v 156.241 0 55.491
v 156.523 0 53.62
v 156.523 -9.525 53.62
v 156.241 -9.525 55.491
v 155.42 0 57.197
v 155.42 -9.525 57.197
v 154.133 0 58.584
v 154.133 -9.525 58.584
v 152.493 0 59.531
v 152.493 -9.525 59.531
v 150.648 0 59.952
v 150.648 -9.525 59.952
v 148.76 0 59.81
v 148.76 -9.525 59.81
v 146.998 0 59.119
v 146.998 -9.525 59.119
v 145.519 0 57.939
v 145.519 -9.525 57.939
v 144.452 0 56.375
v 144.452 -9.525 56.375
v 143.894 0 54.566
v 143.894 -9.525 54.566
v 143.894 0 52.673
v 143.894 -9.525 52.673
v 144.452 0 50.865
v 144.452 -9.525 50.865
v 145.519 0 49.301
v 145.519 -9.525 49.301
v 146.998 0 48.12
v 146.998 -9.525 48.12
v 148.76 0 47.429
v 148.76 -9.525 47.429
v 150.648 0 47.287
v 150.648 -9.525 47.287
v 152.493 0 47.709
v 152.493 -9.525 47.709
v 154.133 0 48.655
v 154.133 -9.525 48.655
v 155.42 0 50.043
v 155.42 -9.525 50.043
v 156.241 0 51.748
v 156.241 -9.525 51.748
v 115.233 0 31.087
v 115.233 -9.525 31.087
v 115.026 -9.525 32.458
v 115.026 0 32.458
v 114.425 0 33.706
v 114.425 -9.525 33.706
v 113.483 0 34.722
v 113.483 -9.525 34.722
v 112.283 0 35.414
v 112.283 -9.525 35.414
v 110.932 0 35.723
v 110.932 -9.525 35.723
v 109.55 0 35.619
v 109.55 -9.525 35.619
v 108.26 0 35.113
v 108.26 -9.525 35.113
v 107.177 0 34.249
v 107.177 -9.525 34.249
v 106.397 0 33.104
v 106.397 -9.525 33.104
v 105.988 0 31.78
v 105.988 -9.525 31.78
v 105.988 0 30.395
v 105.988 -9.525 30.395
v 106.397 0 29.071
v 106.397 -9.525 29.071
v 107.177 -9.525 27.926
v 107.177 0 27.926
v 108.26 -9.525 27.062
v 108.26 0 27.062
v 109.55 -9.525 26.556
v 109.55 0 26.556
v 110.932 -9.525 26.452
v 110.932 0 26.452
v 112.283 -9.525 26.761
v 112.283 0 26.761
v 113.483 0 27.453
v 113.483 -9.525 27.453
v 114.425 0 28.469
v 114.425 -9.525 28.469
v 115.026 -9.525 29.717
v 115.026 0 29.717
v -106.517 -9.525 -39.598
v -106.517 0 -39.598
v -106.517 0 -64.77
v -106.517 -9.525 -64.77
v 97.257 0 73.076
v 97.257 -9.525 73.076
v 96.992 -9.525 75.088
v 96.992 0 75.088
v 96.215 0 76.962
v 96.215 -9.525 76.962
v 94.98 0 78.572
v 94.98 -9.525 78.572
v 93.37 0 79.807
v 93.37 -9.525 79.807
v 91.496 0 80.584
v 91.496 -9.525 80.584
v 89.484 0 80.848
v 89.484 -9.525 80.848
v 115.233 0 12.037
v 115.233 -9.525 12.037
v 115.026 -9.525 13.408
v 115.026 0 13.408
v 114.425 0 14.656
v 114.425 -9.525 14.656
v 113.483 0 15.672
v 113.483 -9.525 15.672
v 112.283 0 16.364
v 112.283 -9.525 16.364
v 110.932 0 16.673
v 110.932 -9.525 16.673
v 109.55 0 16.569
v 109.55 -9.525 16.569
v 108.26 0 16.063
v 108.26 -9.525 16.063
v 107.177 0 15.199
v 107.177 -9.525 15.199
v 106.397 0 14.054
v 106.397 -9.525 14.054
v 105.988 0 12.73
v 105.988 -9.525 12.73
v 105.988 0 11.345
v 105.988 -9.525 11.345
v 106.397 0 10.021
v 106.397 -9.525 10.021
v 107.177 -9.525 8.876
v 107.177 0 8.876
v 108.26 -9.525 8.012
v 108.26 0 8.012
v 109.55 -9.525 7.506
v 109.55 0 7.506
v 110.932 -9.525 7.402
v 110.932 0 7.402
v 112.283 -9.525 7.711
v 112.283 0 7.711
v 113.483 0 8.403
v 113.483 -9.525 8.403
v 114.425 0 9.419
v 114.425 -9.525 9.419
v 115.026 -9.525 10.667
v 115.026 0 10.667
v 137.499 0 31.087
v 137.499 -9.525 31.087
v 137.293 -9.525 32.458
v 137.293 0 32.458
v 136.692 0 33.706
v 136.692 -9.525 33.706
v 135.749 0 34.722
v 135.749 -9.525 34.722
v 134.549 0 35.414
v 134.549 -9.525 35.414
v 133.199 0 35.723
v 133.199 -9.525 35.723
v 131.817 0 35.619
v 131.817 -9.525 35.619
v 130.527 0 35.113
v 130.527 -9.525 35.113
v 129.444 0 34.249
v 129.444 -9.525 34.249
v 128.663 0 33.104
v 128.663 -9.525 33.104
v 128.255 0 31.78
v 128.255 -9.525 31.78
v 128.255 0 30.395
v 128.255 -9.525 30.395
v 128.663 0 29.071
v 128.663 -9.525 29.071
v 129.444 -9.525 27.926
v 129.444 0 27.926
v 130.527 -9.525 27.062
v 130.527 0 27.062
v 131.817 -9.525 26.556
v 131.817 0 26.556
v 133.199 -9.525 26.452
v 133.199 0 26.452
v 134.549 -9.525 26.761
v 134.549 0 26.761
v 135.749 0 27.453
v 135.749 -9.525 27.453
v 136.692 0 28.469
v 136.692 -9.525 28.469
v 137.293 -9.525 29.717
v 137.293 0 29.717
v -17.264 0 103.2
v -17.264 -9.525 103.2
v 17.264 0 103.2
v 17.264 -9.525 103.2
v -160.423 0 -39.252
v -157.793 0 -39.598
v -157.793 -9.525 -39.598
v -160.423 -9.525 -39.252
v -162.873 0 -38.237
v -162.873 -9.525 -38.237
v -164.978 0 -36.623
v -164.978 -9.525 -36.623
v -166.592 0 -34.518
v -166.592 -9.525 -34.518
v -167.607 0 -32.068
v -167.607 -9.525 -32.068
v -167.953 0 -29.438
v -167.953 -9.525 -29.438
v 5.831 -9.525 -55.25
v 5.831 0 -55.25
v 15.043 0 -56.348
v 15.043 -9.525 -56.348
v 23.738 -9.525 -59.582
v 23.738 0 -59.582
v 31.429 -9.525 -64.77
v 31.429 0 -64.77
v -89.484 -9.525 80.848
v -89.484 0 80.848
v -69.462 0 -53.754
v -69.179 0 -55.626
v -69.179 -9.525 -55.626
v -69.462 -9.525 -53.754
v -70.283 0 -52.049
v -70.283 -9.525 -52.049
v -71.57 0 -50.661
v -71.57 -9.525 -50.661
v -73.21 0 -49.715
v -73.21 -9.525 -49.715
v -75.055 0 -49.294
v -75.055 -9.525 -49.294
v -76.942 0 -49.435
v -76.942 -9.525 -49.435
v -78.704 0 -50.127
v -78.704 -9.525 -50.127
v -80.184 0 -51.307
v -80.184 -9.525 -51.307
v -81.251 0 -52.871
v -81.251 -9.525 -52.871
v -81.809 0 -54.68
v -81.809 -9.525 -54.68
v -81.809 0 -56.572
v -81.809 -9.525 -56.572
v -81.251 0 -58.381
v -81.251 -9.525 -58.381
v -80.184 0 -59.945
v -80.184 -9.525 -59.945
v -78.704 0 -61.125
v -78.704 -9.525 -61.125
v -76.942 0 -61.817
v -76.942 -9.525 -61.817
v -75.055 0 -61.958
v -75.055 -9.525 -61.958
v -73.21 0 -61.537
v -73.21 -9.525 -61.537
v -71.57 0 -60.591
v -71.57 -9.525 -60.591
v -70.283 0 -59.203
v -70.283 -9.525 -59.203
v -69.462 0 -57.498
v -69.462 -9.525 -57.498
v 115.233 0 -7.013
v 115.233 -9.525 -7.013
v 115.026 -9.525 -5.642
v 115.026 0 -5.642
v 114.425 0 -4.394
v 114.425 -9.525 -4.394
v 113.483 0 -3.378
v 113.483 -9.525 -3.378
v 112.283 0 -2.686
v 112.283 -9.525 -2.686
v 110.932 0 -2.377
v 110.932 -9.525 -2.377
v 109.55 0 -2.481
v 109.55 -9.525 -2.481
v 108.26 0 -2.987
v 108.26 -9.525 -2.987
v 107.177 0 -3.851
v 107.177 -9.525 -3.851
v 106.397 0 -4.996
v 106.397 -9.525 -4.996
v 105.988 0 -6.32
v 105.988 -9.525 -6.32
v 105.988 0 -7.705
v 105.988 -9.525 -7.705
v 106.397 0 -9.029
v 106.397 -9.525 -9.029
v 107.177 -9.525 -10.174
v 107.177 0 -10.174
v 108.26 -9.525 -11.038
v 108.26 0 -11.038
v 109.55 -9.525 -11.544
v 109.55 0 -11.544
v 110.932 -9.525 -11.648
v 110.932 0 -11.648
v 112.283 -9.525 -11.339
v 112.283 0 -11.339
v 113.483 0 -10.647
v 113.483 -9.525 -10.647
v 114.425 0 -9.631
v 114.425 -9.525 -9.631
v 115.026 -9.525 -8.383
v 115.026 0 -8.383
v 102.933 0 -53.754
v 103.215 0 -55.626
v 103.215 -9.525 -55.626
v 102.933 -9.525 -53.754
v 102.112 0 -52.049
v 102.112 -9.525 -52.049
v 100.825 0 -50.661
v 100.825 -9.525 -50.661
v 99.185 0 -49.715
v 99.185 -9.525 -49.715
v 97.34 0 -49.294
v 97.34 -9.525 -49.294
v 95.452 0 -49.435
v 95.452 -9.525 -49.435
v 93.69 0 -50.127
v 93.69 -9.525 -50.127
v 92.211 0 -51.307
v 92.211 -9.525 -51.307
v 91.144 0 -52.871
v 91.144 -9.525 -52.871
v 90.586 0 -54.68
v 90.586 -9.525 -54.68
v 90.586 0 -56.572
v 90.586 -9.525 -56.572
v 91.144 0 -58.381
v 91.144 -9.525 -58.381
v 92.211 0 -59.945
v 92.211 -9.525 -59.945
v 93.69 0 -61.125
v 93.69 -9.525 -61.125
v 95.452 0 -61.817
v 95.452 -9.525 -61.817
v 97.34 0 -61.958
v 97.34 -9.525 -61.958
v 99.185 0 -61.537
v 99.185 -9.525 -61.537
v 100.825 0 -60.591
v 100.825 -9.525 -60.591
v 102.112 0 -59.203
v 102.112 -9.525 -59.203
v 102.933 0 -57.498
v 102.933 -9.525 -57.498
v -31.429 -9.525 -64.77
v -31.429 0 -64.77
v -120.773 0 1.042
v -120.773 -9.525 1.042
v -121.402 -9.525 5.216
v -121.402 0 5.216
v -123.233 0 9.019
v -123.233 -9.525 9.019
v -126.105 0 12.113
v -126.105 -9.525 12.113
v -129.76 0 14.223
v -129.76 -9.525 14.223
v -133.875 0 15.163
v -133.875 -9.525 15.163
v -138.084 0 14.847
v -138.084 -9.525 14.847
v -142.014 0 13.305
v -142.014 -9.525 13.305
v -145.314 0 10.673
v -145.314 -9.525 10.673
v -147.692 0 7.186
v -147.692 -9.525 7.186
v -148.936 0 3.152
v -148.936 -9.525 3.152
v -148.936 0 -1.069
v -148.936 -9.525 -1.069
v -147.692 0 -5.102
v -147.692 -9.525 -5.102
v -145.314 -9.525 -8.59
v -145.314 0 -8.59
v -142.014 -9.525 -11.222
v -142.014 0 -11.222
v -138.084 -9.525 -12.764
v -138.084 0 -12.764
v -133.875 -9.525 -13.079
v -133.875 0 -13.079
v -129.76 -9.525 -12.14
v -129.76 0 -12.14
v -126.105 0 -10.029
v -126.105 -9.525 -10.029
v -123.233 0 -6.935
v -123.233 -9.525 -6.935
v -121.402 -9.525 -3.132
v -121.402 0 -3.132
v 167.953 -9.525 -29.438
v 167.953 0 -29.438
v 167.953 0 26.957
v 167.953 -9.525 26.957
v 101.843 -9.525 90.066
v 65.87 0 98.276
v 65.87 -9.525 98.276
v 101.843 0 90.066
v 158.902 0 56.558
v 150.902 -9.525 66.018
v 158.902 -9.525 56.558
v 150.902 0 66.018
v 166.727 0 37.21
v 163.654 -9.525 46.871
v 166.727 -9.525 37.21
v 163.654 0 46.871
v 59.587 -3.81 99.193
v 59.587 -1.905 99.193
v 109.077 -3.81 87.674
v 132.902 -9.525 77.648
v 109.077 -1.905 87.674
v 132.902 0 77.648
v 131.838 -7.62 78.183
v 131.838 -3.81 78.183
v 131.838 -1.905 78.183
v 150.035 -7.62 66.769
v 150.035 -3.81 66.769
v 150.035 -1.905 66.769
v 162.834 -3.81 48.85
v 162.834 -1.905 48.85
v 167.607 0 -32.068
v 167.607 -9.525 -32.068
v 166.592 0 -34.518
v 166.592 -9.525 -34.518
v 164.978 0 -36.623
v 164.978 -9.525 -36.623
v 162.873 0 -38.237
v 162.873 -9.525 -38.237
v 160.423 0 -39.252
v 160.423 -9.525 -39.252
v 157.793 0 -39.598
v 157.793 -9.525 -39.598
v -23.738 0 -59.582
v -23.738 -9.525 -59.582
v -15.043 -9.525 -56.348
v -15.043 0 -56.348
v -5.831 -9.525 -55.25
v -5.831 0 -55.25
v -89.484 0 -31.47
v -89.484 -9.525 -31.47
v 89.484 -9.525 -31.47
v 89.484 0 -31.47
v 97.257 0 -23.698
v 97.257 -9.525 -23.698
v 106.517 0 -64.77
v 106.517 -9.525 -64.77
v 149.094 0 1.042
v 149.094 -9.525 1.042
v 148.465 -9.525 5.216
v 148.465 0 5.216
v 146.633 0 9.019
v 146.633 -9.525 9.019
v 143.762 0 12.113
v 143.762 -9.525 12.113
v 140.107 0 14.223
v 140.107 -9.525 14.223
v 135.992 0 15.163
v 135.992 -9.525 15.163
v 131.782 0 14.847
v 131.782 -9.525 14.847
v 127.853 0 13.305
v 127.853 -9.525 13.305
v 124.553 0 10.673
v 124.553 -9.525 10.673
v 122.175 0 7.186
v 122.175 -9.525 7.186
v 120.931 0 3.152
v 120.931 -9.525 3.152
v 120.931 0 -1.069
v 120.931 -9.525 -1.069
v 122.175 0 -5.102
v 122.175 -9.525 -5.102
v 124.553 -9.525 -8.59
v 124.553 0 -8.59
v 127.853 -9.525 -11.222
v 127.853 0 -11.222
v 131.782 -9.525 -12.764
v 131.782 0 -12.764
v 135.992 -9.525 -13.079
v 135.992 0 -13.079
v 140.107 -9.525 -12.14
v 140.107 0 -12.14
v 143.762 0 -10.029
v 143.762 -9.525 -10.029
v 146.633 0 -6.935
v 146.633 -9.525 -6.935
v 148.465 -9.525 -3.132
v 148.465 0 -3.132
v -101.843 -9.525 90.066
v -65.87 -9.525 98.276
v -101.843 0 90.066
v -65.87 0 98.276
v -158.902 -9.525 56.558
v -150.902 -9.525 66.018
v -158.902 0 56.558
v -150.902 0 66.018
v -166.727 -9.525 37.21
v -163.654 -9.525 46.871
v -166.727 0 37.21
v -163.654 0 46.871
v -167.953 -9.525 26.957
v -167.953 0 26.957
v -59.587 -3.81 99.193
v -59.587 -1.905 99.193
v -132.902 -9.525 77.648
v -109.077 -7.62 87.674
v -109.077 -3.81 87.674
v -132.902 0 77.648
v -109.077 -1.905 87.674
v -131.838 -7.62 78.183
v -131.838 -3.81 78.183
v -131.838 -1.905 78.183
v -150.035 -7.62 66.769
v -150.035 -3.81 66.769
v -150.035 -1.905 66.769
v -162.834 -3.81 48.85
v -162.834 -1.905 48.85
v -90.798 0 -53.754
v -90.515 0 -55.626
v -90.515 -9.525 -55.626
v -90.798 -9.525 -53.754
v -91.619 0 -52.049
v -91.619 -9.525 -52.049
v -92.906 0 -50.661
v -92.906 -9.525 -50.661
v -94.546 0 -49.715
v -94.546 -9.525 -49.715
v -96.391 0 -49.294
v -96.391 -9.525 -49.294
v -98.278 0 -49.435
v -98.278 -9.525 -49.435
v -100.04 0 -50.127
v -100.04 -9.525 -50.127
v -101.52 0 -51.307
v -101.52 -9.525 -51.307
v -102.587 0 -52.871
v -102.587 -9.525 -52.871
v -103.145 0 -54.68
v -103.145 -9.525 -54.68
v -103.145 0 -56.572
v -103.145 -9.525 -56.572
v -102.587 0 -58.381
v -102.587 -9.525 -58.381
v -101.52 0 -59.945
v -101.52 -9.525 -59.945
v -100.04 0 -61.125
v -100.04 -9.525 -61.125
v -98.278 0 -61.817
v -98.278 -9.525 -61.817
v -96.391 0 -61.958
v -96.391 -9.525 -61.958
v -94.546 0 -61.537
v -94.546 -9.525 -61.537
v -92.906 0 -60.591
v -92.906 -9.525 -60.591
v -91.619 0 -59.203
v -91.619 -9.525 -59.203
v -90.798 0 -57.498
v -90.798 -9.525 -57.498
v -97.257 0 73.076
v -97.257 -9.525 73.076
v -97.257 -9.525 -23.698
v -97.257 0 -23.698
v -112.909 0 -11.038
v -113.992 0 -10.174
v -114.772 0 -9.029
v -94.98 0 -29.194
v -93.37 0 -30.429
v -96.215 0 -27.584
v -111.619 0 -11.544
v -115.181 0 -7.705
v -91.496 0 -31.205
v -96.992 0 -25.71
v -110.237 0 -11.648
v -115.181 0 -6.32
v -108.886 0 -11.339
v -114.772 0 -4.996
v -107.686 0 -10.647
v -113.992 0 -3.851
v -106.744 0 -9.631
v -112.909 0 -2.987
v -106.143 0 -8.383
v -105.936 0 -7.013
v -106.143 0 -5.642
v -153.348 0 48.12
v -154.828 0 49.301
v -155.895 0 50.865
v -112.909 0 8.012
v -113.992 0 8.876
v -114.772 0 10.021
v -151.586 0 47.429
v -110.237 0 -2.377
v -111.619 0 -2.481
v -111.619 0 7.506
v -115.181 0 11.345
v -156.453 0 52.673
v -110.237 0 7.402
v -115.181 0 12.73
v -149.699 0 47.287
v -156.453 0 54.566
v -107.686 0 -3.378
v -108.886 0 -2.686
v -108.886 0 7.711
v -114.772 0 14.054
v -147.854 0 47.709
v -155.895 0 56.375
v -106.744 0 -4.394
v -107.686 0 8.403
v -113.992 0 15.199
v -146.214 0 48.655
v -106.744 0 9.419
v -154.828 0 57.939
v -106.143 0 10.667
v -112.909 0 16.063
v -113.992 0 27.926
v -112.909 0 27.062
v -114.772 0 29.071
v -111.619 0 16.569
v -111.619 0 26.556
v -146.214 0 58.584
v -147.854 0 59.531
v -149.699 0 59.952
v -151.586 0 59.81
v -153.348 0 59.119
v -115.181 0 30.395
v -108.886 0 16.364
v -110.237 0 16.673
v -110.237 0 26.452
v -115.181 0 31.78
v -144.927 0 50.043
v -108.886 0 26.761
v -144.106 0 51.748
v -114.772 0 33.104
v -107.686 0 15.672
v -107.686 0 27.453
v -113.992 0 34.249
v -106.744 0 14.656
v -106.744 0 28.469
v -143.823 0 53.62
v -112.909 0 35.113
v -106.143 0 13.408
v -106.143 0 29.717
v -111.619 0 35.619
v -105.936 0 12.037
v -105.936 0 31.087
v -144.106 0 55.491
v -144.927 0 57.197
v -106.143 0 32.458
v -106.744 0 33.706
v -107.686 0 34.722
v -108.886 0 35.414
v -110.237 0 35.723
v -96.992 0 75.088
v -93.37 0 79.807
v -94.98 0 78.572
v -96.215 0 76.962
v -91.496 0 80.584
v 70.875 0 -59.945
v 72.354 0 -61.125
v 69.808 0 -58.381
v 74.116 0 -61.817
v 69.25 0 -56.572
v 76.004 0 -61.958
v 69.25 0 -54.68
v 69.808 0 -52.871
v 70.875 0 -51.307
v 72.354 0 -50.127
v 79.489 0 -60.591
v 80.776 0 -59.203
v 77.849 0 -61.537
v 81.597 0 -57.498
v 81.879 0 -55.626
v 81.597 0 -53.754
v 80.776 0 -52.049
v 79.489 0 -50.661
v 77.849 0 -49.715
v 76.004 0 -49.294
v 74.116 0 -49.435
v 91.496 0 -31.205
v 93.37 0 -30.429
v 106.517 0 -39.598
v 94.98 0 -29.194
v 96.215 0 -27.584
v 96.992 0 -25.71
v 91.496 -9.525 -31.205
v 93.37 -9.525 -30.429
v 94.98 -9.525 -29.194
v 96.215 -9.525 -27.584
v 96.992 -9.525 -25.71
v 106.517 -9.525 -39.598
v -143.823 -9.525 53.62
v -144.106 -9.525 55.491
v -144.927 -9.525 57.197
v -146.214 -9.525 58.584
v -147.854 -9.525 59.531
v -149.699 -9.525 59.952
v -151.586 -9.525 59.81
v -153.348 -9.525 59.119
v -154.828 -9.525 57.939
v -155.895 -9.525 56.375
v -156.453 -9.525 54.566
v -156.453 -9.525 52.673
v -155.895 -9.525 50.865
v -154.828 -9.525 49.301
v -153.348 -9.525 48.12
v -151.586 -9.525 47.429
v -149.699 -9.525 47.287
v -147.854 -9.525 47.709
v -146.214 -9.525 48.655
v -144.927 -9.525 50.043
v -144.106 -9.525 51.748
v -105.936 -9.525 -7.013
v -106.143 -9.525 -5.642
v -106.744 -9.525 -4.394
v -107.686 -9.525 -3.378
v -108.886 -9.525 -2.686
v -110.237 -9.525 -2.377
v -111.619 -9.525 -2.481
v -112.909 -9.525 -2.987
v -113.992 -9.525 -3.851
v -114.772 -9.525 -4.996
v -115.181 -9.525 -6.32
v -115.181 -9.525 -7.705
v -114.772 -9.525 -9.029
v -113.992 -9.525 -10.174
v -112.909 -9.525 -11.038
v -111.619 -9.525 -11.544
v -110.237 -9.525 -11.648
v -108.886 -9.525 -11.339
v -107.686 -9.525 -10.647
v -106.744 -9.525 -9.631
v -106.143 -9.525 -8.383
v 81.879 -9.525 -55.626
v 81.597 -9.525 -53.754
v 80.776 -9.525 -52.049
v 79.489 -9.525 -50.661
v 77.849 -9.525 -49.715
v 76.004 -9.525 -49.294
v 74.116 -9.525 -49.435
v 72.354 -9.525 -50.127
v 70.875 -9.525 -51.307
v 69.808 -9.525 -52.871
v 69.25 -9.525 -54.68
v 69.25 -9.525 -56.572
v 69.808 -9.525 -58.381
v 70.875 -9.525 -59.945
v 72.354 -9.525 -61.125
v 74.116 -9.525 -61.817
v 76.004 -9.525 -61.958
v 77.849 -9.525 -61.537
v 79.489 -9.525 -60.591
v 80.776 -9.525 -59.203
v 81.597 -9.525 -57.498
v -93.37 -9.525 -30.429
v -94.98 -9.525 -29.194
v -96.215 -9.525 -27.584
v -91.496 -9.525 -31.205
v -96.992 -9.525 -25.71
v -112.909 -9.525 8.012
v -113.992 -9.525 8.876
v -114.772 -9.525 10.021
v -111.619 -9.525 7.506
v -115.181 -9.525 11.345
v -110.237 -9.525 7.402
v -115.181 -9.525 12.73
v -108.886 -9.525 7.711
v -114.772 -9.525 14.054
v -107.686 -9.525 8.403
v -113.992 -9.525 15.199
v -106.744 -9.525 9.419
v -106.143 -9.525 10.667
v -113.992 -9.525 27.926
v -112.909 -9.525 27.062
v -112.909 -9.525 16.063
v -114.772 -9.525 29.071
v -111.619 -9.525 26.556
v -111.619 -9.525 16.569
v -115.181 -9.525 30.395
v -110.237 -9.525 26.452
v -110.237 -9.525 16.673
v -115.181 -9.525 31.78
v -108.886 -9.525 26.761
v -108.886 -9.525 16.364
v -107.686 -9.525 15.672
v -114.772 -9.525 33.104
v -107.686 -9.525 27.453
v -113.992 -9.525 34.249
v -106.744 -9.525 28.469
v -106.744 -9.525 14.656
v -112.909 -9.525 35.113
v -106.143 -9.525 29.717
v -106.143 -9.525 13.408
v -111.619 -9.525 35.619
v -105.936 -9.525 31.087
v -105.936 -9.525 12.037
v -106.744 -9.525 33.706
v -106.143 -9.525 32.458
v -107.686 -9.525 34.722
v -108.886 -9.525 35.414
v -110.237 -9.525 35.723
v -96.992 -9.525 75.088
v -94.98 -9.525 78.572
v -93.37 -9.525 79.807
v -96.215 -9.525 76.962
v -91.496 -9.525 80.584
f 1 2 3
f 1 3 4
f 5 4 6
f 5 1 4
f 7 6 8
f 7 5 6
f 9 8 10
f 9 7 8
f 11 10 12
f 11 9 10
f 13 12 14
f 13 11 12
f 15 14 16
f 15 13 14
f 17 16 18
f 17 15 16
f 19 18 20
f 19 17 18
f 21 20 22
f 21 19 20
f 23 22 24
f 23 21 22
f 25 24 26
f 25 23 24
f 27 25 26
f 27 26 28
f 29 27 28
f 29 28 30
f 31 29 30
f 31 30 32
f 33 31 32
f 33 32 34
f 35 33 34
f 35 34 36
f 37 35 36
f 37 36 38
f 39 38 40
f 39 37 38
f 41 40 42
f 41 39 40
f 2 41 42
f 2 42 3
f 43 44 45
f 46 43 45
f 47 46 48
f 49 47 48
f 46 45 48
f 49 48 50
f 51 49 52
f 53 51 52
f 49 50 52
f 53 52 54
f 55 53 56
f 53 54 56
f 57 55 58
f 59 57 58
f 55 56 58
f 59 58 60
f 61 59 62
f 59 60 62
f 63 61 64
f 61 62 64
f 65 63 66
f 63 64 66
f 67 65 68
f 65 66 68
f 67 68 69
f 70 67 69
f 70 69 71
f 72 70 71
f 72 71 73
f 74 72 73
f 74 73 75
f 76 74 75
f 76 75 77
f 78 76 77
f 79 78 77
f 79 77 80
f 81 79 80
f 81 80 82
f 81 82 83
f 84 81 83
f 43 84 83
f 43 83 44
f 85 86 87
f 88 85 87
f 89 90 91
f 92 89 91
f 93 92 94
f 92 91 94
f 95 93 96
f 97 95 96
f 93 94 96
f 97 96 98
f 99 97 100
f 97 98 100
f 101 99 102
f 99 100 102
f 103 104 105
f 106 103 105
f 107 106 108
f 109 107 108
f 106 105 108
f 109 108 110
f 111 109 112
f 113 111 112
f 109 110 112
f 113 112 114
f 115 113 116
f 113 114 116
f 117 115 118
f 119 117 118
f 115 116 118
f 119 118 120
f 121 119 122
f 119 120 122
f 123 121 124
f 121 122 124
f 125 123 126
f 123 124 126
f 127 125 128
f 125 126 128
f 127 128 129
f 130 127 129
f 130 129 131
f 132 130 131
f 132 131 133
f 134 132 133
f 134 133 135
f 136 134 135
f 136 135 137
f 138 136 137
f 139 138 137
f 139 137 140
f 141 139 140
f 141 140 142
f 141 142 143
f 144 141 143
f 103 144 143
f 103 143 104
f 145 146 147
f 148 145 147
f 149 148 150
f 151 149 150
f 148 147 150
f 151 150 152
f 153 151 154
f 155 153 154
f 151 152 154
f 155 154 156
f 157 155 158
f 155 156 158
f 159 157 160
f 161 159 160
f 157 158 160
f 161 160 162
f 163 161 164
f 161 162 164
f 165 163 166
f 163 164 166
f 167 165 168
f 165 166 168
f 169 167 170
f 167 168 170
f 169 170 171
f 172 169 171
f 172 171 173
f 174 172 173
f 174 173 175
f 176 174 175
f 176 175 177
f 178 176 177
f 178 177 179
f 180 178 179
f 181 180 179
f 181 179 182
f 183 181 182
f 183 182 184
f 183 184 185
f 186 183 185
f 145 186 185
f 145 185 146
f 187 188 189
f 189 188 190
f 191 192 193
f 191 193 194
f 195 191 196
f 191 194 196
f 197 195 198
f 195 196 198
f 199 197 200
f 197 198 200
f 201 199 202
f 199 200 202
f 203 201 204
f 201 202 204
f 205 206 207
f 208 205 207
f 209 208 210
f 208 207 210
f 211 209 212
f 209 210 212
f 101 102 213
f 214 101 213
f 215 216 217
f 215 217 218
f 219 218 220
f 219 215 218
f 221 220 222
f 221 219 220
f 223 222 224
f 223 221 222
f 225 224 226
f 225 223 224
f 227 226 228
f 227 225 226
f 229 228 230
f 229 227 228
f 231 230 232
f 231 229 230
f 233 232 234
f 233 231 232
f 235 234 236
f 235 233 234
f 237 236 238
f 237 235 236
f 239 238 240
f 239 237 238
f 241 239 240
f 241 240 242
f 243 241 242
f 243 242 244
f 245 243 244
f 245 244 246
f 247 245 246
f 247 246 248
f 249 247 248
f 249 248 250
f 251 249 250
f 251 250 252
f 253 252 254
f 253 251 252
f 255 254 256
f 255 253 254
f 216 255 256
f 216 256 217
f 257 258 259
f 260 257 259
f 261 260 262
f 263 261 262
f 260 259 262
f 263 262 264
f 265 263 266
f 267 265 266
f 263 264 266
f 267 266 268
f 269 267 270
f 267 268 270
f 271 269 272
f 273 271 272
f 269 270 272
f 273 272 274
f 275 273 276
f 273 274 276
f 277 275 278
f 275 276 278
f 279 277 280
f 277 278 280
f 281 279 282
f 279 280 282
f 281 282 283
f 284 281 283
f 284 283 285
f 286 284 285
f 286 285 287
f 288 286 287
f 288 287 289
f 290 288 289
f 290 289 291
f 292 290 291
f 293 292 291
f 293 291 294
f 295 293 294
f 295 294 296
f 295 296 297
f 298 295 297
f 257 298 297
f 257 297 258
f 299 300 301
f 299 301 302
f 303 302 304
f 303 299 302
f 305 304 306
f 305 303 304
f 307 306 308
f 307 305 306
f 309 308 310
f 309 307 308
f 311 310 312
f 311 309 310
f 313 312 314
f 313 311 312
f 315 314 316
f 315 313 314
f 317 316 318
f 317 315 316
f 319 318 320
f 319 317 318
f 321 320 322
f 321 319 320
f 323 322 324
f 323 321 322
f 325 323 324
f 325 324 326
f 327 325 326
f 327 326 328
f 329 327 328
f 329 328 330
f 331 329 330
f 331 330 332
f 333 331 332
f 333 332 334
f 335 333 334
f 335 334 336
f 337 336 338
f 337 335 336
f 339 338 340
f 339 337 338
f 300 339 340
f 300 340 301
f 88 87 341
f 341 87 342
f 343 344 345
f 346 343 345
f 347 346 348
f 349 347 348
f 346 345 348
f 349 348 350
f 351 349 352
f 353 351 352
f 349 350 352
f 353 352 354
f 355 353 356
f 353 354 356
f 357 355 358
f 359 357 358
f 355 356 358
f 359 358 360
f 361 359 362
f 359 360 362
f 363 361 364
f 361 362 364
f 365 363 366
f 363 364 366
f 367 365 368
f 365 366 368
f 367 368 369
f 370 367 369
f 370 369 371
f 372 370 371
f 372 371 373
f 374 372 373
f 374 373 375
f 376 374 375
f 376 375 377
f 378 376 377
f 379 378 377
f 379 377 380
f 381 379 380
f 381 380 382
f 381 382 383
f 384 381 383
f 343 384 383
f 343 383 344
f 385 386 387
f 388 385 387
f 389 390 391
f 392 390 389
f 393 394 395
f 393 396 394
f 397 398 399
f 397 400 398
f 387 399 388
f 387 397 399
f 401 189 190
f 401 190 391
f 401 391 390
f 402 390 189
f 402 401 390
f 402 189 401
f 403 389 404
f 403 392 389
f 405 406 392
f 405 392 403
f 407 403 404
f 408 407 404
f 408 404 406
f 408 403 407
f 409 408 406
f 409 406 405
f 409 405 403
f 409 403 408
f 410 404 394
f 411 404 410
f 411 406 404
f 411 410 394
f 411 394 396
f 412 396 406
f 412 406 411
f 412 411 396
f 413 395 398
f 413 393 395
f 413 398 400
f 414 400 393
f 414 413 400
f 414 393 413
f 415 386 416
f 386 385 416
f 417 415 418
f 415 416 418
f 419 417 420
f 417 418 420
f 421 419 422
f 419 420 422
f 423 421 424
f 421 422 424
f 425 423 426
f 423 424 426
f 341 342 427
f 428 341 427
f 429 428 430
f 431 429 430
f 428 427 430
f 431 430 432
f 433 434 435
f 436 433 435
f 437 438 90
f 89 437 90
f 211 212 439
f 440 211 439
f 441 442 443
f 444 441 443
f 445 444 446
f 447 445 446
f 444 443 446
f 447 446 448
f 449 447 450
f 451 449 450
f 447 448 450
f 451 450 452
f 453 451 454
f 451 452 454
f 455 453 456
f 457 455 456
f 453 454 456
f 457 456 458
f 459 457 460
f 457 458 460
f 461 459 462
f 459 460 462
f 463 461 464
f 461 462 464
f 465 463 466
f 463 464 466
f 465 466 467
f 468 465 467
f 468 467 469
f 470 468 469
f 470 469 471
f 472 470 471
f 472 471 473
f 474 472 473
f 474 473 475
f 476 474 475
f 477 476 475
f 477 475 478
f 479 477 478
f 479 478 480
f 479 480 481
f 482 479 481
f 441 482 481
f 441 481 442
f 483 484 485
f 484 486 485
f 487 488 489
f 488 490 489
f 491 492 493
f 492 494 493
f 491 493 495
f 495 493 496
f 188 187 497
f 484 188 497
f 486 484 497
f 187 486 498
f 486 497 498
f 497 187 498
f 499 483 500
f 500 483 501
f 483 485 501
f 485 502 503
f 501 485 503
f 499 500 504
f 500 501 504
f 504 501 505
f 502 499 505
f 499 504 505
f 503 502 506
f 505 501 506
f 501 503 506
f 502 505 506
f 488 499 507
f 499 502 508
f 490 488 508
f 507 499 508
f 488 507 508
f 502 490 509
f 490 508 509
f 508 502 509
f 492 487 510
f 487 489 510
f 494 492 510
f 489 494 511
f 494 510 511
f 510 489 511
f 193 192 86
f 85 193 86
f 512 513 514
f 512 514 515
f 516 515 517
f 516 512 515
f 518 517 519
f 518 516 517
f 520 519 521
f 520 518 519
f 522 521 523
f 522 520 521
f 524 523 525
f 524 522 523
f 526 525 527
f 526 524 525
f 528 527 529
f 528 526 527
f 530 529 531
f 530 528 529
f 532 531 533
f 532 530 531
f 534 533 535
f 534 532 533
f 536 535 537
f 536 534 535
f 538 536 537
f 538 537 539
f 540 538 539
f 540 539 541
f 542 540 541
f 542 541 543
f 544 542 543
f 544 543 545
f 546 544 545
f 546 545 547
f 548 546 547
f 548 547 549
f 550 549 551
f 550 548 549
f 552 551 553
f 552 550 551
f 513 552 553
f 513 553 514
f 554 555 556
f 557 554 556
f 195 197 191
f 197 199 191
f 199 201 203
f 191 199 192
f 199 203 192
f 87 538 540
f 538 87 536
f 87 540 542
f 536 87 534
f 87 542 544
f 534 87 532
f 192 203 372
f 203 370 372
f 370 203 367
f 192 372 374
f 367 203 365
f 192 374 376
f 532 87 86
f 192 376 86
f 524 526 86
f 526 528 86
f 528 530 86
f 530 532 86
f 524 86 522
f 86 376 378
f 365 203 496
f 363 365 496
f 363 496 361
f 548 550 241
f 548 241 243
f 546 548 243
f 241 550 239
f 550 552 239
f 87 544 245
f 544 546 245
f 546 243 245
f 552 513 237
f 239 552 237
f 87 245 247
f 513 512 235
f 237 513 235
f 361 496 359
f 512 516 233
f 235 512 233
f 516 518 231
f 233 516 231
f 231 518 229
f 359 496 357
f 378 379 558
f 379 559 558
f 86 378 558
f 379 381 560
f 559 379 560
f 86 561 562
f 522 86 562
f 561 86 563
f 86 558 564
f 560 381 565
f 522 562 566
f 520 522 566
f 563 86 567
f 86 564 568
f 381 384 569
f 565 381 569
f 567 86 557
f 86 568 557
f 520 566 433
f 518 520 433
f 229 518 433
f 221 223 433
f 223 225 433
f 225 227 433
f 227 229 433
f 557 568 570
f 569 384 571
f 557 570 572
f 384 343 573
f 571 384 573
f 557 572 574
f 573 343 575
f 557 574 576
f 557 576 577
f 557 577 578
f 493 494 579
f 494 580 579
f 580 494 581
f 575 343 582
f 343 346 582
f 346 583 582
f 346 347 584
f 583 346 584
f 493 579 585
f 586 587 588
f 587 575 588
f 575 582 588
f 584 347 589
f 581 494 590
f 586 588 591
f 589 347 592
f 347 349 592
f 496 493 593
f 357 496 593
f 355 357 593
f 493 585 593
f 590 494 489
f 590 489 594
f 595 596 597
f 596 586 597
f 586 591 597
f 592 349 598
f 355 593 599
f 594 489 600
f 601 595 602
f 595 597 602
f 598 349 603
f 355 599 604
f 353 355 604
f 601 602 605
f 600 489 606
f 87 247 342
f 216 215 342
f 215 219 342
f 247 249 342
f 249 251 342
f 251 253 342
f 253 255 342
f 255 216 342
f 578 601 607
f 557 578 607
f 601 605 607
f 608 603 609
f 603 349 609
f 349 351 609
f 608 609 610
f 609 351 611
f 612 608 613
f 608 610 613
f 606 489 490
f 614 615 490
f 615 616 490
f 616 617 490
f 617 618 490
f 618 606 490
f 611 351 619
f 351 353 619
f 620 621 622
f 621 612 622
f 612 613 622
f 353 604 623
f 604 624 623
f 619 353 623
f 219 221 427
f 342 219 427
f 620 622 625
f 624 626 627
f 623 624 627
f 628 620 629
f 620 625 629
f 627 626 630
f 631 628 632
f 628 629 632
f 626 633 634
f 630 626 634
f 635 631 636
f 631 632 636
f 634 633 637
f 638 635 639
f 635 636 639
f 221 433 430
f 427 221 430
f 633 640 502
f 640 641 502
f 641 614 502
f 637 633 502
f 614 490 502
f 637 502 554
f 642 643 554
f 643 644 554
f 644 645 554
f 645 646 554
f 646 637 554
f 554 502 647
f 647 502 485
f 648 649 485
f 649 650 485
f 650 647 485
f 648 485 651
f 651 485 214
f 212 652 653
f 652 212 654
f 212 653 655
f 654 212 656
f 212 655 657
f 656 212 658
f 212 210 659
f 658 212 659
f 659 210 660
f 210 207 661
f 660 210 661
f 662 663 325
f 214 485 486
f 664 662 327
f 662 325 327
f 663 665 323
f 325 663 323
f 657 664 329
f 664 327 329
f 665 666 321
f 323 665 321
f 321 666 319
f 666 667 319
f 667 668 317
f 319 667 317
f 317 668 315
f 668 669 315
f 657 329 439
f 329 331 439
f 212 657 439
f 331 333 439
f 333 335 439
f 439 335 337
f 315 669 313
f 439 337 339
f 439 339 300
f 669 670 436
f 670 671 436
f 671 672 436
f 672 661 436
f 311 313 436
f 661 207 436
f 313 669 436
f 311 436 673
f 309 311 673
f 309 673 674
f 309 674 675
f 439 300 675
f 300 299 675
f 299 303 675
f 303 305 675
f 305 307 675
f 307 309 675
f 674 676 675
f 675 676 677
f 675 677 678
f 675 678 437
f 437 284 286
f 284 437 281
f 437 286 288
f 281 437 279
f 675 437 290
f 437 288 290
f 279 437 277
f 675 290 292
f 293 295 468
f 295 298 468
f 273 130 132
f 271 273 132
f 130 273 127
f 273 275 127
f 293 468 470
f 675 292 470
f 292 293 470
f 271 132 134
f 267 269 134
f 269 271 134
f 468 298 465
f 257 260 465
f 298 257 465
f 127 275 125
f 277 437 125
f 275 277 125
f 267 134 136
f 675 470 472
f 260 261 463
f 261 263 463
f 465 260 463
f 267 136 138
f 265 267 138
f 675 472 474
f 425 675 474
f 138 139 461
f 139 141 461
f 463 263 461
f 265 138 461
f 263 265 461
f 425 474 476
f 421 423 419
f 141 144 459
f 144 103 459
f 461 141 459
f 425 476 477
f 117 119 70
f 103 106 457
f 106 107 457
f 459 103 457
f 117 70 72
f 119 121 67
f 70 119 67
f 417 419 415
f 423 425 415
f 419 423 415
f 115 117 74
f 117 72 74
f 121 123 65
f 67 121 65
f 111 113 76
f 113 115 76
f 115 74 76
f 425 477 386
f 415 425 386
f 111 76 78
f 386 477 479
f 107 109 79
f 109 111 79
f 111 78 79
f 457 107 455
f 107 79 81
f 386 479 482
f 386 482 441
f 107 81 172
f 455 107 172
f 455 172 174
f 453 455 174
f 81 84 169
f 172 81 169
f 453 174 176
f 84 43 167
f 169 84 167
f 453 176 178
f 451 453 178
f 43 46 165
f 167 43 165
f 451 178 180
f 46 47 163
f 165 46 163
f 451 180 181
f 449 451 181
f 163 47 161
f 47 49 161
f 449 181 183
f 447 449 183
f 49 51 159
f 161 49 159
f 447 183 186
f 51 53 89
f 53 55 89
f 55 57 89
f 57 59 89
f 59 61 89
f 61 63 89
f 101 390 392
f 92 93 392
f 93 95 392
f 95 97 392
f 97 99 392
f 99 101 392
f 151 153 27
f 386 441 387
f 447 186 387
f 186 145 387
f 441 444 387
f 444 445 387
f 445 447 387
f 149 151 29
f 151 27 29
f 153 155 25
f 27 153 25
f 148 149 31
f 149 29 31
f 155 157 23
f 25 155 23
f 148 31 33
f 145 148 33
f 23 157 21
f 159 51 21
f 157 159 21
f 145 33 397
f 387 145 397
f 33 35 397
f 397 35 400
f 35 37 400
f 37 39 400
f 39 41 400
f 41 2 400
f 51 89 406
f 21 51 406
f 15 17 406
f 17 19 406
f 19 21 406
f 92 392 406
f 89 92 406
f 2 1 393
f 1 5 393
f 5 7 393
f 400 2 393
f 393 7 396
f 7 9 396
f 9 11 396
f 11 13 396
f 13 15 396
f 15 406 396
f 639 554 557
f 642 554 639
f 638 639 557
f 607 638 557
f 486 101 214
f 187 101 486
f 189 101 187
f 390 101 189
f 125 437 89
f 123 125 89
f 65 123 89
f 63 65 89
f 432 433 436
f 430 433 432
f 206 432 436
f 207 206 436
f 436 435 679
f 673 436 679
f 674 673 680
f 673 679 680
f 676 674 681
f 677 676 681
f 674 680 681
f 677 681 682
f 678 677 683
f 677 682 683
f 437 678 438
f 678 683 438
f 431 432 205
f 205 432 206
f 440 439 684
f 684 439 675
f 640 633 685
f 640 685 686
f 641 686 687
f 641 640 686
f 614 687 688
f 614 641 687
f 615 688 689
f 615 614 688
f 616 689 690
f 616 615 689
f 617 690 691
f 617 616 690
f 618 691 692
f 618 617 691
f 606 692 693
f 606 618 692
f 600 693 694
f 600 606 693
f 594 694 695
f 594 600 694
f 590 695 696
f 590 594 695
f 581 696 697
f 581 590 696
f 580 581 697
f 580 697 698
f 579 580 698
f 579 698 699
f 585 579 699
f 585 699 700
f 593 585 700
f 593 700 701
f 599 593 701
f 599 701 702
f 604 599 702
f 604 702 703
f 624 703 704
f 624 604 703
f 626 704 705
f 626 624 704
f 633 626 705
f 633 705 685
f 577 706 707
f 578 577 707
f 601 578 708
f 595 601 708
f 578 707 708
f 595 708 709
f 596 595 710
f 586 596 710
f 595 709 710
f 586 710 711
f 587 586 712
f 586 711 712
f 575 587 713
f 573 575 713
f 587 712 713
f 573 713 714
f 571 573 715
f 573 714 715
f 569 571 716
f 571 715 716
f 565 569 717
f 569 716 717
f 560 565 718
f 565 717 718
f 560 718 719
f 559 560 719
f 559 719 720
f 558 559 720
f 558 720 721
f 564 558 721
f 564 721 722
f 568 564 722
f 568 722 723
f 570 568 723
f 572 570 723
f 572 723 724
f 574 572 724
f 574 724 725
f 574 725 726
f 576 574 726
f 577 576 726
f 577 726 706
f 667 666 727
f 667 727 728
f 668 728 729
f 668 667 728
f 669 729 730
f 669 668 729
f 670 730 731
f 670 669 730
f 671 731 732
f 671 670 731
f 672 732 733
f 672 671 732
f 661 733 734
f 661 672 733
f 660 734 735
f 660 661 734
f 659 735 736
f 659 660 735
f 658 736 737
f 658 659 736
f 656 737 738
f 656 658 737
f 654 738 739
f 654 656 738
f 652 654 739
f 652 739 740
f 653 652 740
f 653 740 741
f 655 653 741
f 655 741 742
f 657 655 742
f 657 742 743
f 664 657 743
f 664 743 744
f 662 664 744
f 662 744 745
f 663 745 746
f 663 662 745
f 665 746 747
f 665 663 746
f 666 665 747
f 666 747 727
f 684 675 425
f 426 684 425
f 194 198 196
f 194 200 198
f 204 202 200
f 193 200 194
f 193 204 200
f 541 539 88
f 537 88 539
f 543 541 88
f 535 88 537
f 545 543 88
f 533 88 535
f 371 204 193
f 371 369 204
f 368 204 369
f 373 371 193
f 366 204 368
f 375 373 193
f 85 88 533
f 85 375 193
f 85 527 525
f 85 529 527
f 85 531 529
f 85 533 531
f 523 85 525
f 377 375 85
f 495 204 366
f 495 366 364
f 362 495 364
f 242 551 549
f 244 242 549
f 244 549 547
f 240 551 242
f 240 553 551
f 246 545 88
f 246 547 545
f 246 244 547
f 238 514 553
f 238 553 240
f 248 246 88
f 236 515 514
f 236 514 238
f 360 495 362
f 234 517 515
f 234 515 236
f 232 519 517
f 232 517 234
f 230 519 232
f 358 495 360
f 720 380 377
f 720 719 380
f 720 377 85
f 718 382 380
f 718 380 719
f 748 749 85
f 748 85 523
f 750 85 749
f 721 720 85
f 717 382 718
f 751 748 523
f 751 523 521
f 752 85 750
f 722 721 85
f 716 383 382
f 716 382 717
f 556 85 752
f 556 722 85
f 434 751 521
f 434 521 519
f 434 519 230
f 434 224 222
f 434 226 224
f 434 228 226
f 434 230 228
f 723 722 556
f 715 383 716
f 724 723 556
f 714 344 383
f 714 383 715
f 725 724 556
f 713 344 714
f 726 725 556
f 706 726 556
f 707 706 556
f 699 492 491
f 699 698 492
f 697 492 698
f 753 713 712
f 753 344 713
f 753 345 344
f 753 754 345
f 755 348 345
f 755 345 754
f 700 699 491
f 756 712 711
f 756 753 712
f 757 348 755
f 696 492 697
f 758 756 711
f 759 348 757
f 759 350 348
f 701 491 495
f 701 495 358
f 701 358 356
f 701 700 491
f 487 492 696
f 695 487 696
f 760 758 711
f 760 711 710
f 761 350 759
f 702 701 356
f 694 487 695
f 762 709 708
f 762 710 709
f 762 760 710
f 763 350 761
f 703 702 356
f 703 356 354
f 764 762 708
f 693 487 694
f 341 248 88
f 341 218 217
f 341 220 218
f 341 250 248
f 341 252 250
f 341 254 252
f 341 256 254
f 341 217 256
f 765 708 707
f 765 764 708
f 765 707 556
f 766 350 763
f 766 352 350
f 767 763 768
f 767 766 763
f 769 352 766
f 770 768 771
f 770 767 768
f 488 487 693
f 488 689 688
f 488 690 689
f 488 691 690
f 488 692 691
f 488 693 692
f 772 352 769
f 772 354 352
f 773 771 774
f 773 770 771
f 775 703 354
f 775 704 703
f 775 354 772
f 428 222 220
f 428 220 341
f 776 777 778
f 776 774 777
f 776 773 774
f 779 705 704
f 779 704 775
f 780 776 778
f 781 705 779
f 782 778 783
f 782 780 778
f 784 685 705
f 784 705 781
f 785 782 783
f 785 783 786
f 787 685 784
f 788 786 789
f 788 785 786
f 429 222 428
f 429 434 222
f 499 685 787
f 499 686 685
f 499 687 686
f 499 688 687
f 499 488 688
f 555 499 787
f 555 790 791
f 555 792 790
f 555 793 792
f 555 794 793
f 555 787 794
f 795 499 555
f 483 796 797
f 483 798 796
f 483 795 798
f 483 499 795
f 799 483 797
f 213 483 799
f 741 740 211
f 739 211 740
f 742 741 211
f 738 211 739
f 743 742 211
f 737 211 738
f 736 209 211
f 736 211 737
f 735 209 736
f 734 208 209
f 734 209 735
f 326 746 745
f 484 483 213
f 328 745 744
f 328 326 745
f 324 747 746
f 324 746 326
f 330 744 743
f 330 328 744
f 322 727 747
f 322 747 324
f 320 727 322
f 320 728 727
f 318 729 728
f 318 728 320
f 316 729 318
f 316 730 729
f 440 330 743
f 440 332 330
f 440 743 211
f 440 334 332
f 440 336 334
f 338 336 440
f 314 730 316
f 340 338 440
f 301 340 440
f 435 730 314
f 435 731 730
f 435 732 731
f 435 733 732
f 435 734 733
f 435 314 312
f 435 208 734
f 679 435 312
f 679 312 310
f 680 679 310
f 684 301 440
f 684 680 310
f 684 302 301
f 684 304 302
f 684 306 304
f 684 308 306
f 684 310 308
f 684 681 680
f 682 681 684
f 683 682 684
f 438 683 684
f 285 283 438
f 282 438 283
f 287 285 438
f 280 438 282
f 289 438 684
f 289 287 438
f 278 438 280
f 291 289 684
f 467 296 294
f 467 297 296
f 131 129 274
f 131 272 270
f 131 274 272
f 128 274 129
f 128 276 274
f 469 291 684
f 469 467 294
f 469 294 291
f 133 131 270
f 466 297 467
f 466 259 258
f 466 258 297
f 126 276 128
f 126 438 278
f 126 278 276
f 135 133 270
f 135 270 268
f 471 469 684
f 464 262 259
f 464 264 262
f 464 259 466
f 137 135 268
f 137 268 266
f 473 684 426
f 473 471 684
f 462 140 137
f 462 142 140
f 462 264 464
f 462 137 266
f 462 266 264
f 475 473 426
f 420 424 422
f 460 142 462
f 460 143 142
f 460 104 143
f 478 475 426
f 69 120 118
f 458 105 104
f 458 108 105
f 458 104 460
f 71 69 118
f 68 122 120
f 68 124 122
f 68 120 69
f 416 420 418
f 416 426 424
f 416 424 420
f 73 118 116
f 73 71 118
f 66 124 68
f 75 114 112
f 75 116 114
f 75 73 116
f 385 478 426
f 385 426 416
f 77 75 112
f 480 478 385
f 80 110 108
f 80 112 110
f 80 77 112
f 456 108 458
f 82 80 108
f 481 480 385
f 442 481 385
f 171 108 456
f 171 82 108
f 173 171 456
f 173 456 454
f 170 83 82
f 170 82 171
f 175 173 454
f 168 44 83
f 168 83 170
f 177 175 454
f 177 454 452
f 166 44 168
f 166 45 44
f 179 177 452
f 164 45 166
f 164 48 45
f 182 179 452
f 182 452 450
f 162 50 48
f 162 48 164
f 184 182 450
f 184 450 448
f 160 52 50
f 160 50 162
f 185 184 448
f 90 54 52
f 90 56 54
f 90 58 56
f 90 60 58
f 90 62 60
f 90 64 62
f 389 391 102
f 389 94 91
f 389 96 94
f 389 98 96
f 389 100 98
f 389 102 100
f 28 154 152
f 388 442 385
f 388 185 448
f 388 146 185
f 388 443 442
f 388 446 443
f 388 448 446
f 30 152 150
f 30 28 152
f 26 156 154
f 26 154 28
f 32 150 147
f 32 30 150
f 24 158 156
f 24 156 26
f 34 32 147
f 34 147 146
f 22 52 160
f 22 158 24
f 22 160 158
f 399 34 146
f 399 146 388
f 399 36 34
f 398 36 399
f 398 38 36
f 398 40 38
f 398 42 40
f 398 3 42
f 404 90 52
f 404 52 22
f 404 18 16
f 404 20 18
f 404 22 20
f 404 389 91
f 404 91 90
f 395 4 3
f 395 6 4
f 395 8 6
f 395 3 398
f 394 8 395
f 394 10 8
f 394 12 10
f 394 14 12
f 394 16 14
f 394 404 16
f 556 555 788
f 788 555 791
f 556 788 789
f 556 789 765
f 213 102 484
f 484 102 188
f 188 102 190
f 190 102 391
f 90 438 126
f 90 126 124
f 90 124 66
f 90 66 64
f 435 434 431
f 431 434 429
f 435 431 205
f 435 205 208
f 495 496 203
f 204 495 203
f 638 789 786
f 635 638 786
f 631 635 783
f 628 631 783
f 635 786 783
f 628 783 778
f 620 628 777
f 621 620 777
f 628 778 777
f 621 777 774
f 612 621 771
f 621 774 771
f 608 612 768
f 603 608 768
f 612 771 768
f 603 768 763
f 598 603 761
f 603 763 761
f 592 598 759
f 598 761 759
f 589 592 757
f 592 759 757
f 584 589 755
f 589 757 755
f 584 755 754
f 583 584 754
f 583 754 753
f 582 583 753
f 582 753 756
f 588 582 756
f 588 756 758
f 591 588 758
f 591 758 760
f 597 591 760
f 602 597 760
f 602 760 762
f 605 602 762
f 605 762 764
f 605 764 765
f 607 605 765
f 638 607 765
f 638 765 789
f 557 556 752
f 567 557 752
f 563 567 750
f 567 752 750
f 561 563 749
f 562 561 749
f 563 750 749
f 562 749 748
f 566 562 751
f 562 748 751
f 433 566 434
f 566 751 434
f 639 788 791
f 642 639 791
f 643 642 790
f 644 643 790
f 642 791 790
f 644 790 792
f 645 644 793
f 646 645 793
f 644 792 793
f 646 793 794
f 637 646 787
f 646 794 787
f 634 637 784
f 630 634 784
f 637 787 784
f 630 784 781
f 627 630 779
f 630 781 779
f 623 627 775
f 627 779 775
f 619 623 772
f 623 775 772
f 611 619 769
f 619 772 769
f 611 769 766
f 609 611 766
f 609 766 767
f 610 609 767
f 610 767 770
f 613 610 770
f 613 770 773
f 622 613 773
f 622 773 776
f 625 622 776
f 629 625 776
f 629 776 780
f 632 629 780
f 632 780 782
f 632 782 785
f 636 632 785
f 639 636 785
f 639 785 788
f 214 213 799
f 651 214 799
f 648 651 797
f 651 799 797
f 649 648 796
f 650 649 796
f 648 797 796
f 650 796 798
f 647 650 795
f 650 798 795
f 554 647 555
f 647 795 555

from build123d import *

# Parameters (mm, degrees)
F0_R     = 6.35
F1_DEPTH = 9.525
F2_R     = 10.16
F4_DEPTH = 25.4
F5_R     = 254
F6_R     = 4.6482
F6_R_2   = 14.1605
F7_DEPTH = 25.4


with BuildPart() as f1:
    # F0 (on Front) → F1 (new body)
    with BuildSketch(Plane.XZ):
        with BuildLine():
            Line((-106.5174639225, -64.77), (-31.4290560782, -64.77))
            ThreePointArc((-31.4290560782, -64.77), (-19.4864111897, -57.7068407051), (-5.8307349682, -55.249709636))
            Line((-5.8307349682, -55.249709636), (0, -55.249709636))
            Line((0, -55.249709636), (5.8307349682, -55.249709636))
            ThreePointArc((5.8307349682, -55.249709636), (19.4864111897, -57.7068407051), (31.4290560782, -64.77))
            Line((31.4290560782, -64.77), (106.5174639225, -64.77))
            Line((106.5174639225, -64.77), (106.5174639225, -39.5983140361))
            Line((106.5174639225, -39.5983140361), (167.9534316063, -39.5983140361))
            Line((167.9534316063, -39.5983140361), (167.9534316063, 26.9573238301))
            add(Edge.make_bspline(
                [(0, 104.3131649494), (20.410301584, 103.0330934585), (59.6583638346, 100.5752160198), (107.8367322286, 90.1029474639), (151.6277590611, 69.5902698618), (163.4617376042, 49.6125522636), (167.9534316063, 34.663336698), (167.9534316063, 26.9573238301)],
                knots=[0, 0, 0, 0, 0.2488471703, 0.4782216393, 0.6964249219, 0.8474229551, 1, 1, 1, 1], degree=3))
            add(Edge.make_bspline(
                [(0, 104.3131649494), (-20.410301584, 103.0330934585), (-59.6583638346, 100.5752160198), (-107.8367322286, 90.1029474639), (-151.6277590611, 69.5902698618), (-163.4617376042, 49.6125522636), (-167.9534316063, 34.663336698), (-167.9534316063, 26.9573238301)],
                knots=[0, 0, 0, 0, 0.2488471703, 0.4782216393, 0.6964249219, 0.8474229551, 1, 1, 1, 1], degree=3))
            Line((-167.9534316063, 26.9573238301), (-167.9534316063, -39.5983140361))
            Line((-167.9534316063, -39.5983140361), (-106.5174639225, -39.5983140361))
            Line((-106.5174639225, -39.5983140361), (-106.5174639225, -64.77))
        make_face()
        with Locations((-96.8654639225, -55.626)):
            Circle(F0_R, mode=Mode.SUBTRACT)
        with Locations((-75.5294639225, -55.626)):
            Circle(F0_R, mode=Mode.SUBTRACT)
        with Locations((75.5294639225, -55.626)):
            Circle(F0_R, mode=Mode.SUBTRACT)
        with Locations((96.8654639225, -55.626)):
            Circle(F0_R, mode=Mode.SUBTRACT)
        with Locations((-150.1734316063, 53.6196859639)):
            Circle(F0_R, mode=Mode.SUBTRACT)
        with Locations((150.1734316063, 53.6196859639)):
            Circle(F0_R, mode=Mode.SUBTRACT)
    extrude(amount=F1_DEPTH)

    # F2
    f2_edges = [f1.edges().sort_by_distance(p)[0] for p in [
        (167.953432, -4.7625, -39.598314),
        (-167.953432, -4.7625, -39.598314),
    ]]
    fillet(f2_edges, radius=F2_R)

    # F3 (on face) → F4 (cut)
    with BuildSketch(Plane.XZ.offset(9.525)):
        with BuildLine():
            ThreePointArc((-97.2566, -23.6979140361), (-94.9801167461, -29.1938307822), (-89.4842, -31.4703140361))
            Line((-89.4842, -31.4703140361), (89.4842, -31.4703140361))
            ThreePointArc((89.4842, -31.4703140361), (94.9801167461, -29.1938307822), (97.2566, -23.6979140361))
            Line((97.2566, -23.6979140361), (97.2566, 73.0760859639))
            ThreePointArc((97.2566, 73.0760859639), (94.9801167461, 78.57200271), (89.4842, 80.8484859639))
            Line((89.4842, 80.8484859639), (-89.4842, 80.8484859639))
            ThreePointArc((-89.4842, 80.8484859639), (-94.9801167461, 78.57200271), (-97.2566, 73.0760859639))
            Line((-97.2566, 73.0760859639), (-97.2566, -23.6979140361))
        make_face()
    extrude(amount=-F4_DEPTH, mode=Mode.SUBTRACT)

    # F5
    f5_edges = [f1.edges().sort_by_distance(p)[0] for p in [
        (0, -4.7625, 104.313165),
    ]]
    fillet(f5_edges, radius=F5_R)

    # F6 (on face) → F7 (cut)
    with BuildSketch(Plane.XZ.offset(9.525)):
        with Locations((-110.5845943093, 12.0374655791)):
            Circle(F6_R)
        with Locations((-110.5845943093, 31.0874655791)):
            Circle(F6_R)
        with Locations((-110.5845943093, -7.0125344209)):
            Circle(F6_R)
        with Locations((-134.9334316063, 1.0416859639)):
            Circle(F6_R_2)
        with Locations((110.5845943093, 31.0874655791)):
            Circle(F6_R)
        with Locations((110.5845943093, 12.0374655791)):
            Circle(F6_R)
        with Locations((110.5845943093, -7.0125344209)):
            Circle(F6_R)
        with Locations((132.8512136193, 31.0874655791)):
            Circle(F6_R)
        with Locations((134.9334316063, 1.0416859639)):
            Circle(F6_R_2)
    extrude(amount=-F7_DEPTH, mode=Mode.SUBTRACT)


solid = f1.part
